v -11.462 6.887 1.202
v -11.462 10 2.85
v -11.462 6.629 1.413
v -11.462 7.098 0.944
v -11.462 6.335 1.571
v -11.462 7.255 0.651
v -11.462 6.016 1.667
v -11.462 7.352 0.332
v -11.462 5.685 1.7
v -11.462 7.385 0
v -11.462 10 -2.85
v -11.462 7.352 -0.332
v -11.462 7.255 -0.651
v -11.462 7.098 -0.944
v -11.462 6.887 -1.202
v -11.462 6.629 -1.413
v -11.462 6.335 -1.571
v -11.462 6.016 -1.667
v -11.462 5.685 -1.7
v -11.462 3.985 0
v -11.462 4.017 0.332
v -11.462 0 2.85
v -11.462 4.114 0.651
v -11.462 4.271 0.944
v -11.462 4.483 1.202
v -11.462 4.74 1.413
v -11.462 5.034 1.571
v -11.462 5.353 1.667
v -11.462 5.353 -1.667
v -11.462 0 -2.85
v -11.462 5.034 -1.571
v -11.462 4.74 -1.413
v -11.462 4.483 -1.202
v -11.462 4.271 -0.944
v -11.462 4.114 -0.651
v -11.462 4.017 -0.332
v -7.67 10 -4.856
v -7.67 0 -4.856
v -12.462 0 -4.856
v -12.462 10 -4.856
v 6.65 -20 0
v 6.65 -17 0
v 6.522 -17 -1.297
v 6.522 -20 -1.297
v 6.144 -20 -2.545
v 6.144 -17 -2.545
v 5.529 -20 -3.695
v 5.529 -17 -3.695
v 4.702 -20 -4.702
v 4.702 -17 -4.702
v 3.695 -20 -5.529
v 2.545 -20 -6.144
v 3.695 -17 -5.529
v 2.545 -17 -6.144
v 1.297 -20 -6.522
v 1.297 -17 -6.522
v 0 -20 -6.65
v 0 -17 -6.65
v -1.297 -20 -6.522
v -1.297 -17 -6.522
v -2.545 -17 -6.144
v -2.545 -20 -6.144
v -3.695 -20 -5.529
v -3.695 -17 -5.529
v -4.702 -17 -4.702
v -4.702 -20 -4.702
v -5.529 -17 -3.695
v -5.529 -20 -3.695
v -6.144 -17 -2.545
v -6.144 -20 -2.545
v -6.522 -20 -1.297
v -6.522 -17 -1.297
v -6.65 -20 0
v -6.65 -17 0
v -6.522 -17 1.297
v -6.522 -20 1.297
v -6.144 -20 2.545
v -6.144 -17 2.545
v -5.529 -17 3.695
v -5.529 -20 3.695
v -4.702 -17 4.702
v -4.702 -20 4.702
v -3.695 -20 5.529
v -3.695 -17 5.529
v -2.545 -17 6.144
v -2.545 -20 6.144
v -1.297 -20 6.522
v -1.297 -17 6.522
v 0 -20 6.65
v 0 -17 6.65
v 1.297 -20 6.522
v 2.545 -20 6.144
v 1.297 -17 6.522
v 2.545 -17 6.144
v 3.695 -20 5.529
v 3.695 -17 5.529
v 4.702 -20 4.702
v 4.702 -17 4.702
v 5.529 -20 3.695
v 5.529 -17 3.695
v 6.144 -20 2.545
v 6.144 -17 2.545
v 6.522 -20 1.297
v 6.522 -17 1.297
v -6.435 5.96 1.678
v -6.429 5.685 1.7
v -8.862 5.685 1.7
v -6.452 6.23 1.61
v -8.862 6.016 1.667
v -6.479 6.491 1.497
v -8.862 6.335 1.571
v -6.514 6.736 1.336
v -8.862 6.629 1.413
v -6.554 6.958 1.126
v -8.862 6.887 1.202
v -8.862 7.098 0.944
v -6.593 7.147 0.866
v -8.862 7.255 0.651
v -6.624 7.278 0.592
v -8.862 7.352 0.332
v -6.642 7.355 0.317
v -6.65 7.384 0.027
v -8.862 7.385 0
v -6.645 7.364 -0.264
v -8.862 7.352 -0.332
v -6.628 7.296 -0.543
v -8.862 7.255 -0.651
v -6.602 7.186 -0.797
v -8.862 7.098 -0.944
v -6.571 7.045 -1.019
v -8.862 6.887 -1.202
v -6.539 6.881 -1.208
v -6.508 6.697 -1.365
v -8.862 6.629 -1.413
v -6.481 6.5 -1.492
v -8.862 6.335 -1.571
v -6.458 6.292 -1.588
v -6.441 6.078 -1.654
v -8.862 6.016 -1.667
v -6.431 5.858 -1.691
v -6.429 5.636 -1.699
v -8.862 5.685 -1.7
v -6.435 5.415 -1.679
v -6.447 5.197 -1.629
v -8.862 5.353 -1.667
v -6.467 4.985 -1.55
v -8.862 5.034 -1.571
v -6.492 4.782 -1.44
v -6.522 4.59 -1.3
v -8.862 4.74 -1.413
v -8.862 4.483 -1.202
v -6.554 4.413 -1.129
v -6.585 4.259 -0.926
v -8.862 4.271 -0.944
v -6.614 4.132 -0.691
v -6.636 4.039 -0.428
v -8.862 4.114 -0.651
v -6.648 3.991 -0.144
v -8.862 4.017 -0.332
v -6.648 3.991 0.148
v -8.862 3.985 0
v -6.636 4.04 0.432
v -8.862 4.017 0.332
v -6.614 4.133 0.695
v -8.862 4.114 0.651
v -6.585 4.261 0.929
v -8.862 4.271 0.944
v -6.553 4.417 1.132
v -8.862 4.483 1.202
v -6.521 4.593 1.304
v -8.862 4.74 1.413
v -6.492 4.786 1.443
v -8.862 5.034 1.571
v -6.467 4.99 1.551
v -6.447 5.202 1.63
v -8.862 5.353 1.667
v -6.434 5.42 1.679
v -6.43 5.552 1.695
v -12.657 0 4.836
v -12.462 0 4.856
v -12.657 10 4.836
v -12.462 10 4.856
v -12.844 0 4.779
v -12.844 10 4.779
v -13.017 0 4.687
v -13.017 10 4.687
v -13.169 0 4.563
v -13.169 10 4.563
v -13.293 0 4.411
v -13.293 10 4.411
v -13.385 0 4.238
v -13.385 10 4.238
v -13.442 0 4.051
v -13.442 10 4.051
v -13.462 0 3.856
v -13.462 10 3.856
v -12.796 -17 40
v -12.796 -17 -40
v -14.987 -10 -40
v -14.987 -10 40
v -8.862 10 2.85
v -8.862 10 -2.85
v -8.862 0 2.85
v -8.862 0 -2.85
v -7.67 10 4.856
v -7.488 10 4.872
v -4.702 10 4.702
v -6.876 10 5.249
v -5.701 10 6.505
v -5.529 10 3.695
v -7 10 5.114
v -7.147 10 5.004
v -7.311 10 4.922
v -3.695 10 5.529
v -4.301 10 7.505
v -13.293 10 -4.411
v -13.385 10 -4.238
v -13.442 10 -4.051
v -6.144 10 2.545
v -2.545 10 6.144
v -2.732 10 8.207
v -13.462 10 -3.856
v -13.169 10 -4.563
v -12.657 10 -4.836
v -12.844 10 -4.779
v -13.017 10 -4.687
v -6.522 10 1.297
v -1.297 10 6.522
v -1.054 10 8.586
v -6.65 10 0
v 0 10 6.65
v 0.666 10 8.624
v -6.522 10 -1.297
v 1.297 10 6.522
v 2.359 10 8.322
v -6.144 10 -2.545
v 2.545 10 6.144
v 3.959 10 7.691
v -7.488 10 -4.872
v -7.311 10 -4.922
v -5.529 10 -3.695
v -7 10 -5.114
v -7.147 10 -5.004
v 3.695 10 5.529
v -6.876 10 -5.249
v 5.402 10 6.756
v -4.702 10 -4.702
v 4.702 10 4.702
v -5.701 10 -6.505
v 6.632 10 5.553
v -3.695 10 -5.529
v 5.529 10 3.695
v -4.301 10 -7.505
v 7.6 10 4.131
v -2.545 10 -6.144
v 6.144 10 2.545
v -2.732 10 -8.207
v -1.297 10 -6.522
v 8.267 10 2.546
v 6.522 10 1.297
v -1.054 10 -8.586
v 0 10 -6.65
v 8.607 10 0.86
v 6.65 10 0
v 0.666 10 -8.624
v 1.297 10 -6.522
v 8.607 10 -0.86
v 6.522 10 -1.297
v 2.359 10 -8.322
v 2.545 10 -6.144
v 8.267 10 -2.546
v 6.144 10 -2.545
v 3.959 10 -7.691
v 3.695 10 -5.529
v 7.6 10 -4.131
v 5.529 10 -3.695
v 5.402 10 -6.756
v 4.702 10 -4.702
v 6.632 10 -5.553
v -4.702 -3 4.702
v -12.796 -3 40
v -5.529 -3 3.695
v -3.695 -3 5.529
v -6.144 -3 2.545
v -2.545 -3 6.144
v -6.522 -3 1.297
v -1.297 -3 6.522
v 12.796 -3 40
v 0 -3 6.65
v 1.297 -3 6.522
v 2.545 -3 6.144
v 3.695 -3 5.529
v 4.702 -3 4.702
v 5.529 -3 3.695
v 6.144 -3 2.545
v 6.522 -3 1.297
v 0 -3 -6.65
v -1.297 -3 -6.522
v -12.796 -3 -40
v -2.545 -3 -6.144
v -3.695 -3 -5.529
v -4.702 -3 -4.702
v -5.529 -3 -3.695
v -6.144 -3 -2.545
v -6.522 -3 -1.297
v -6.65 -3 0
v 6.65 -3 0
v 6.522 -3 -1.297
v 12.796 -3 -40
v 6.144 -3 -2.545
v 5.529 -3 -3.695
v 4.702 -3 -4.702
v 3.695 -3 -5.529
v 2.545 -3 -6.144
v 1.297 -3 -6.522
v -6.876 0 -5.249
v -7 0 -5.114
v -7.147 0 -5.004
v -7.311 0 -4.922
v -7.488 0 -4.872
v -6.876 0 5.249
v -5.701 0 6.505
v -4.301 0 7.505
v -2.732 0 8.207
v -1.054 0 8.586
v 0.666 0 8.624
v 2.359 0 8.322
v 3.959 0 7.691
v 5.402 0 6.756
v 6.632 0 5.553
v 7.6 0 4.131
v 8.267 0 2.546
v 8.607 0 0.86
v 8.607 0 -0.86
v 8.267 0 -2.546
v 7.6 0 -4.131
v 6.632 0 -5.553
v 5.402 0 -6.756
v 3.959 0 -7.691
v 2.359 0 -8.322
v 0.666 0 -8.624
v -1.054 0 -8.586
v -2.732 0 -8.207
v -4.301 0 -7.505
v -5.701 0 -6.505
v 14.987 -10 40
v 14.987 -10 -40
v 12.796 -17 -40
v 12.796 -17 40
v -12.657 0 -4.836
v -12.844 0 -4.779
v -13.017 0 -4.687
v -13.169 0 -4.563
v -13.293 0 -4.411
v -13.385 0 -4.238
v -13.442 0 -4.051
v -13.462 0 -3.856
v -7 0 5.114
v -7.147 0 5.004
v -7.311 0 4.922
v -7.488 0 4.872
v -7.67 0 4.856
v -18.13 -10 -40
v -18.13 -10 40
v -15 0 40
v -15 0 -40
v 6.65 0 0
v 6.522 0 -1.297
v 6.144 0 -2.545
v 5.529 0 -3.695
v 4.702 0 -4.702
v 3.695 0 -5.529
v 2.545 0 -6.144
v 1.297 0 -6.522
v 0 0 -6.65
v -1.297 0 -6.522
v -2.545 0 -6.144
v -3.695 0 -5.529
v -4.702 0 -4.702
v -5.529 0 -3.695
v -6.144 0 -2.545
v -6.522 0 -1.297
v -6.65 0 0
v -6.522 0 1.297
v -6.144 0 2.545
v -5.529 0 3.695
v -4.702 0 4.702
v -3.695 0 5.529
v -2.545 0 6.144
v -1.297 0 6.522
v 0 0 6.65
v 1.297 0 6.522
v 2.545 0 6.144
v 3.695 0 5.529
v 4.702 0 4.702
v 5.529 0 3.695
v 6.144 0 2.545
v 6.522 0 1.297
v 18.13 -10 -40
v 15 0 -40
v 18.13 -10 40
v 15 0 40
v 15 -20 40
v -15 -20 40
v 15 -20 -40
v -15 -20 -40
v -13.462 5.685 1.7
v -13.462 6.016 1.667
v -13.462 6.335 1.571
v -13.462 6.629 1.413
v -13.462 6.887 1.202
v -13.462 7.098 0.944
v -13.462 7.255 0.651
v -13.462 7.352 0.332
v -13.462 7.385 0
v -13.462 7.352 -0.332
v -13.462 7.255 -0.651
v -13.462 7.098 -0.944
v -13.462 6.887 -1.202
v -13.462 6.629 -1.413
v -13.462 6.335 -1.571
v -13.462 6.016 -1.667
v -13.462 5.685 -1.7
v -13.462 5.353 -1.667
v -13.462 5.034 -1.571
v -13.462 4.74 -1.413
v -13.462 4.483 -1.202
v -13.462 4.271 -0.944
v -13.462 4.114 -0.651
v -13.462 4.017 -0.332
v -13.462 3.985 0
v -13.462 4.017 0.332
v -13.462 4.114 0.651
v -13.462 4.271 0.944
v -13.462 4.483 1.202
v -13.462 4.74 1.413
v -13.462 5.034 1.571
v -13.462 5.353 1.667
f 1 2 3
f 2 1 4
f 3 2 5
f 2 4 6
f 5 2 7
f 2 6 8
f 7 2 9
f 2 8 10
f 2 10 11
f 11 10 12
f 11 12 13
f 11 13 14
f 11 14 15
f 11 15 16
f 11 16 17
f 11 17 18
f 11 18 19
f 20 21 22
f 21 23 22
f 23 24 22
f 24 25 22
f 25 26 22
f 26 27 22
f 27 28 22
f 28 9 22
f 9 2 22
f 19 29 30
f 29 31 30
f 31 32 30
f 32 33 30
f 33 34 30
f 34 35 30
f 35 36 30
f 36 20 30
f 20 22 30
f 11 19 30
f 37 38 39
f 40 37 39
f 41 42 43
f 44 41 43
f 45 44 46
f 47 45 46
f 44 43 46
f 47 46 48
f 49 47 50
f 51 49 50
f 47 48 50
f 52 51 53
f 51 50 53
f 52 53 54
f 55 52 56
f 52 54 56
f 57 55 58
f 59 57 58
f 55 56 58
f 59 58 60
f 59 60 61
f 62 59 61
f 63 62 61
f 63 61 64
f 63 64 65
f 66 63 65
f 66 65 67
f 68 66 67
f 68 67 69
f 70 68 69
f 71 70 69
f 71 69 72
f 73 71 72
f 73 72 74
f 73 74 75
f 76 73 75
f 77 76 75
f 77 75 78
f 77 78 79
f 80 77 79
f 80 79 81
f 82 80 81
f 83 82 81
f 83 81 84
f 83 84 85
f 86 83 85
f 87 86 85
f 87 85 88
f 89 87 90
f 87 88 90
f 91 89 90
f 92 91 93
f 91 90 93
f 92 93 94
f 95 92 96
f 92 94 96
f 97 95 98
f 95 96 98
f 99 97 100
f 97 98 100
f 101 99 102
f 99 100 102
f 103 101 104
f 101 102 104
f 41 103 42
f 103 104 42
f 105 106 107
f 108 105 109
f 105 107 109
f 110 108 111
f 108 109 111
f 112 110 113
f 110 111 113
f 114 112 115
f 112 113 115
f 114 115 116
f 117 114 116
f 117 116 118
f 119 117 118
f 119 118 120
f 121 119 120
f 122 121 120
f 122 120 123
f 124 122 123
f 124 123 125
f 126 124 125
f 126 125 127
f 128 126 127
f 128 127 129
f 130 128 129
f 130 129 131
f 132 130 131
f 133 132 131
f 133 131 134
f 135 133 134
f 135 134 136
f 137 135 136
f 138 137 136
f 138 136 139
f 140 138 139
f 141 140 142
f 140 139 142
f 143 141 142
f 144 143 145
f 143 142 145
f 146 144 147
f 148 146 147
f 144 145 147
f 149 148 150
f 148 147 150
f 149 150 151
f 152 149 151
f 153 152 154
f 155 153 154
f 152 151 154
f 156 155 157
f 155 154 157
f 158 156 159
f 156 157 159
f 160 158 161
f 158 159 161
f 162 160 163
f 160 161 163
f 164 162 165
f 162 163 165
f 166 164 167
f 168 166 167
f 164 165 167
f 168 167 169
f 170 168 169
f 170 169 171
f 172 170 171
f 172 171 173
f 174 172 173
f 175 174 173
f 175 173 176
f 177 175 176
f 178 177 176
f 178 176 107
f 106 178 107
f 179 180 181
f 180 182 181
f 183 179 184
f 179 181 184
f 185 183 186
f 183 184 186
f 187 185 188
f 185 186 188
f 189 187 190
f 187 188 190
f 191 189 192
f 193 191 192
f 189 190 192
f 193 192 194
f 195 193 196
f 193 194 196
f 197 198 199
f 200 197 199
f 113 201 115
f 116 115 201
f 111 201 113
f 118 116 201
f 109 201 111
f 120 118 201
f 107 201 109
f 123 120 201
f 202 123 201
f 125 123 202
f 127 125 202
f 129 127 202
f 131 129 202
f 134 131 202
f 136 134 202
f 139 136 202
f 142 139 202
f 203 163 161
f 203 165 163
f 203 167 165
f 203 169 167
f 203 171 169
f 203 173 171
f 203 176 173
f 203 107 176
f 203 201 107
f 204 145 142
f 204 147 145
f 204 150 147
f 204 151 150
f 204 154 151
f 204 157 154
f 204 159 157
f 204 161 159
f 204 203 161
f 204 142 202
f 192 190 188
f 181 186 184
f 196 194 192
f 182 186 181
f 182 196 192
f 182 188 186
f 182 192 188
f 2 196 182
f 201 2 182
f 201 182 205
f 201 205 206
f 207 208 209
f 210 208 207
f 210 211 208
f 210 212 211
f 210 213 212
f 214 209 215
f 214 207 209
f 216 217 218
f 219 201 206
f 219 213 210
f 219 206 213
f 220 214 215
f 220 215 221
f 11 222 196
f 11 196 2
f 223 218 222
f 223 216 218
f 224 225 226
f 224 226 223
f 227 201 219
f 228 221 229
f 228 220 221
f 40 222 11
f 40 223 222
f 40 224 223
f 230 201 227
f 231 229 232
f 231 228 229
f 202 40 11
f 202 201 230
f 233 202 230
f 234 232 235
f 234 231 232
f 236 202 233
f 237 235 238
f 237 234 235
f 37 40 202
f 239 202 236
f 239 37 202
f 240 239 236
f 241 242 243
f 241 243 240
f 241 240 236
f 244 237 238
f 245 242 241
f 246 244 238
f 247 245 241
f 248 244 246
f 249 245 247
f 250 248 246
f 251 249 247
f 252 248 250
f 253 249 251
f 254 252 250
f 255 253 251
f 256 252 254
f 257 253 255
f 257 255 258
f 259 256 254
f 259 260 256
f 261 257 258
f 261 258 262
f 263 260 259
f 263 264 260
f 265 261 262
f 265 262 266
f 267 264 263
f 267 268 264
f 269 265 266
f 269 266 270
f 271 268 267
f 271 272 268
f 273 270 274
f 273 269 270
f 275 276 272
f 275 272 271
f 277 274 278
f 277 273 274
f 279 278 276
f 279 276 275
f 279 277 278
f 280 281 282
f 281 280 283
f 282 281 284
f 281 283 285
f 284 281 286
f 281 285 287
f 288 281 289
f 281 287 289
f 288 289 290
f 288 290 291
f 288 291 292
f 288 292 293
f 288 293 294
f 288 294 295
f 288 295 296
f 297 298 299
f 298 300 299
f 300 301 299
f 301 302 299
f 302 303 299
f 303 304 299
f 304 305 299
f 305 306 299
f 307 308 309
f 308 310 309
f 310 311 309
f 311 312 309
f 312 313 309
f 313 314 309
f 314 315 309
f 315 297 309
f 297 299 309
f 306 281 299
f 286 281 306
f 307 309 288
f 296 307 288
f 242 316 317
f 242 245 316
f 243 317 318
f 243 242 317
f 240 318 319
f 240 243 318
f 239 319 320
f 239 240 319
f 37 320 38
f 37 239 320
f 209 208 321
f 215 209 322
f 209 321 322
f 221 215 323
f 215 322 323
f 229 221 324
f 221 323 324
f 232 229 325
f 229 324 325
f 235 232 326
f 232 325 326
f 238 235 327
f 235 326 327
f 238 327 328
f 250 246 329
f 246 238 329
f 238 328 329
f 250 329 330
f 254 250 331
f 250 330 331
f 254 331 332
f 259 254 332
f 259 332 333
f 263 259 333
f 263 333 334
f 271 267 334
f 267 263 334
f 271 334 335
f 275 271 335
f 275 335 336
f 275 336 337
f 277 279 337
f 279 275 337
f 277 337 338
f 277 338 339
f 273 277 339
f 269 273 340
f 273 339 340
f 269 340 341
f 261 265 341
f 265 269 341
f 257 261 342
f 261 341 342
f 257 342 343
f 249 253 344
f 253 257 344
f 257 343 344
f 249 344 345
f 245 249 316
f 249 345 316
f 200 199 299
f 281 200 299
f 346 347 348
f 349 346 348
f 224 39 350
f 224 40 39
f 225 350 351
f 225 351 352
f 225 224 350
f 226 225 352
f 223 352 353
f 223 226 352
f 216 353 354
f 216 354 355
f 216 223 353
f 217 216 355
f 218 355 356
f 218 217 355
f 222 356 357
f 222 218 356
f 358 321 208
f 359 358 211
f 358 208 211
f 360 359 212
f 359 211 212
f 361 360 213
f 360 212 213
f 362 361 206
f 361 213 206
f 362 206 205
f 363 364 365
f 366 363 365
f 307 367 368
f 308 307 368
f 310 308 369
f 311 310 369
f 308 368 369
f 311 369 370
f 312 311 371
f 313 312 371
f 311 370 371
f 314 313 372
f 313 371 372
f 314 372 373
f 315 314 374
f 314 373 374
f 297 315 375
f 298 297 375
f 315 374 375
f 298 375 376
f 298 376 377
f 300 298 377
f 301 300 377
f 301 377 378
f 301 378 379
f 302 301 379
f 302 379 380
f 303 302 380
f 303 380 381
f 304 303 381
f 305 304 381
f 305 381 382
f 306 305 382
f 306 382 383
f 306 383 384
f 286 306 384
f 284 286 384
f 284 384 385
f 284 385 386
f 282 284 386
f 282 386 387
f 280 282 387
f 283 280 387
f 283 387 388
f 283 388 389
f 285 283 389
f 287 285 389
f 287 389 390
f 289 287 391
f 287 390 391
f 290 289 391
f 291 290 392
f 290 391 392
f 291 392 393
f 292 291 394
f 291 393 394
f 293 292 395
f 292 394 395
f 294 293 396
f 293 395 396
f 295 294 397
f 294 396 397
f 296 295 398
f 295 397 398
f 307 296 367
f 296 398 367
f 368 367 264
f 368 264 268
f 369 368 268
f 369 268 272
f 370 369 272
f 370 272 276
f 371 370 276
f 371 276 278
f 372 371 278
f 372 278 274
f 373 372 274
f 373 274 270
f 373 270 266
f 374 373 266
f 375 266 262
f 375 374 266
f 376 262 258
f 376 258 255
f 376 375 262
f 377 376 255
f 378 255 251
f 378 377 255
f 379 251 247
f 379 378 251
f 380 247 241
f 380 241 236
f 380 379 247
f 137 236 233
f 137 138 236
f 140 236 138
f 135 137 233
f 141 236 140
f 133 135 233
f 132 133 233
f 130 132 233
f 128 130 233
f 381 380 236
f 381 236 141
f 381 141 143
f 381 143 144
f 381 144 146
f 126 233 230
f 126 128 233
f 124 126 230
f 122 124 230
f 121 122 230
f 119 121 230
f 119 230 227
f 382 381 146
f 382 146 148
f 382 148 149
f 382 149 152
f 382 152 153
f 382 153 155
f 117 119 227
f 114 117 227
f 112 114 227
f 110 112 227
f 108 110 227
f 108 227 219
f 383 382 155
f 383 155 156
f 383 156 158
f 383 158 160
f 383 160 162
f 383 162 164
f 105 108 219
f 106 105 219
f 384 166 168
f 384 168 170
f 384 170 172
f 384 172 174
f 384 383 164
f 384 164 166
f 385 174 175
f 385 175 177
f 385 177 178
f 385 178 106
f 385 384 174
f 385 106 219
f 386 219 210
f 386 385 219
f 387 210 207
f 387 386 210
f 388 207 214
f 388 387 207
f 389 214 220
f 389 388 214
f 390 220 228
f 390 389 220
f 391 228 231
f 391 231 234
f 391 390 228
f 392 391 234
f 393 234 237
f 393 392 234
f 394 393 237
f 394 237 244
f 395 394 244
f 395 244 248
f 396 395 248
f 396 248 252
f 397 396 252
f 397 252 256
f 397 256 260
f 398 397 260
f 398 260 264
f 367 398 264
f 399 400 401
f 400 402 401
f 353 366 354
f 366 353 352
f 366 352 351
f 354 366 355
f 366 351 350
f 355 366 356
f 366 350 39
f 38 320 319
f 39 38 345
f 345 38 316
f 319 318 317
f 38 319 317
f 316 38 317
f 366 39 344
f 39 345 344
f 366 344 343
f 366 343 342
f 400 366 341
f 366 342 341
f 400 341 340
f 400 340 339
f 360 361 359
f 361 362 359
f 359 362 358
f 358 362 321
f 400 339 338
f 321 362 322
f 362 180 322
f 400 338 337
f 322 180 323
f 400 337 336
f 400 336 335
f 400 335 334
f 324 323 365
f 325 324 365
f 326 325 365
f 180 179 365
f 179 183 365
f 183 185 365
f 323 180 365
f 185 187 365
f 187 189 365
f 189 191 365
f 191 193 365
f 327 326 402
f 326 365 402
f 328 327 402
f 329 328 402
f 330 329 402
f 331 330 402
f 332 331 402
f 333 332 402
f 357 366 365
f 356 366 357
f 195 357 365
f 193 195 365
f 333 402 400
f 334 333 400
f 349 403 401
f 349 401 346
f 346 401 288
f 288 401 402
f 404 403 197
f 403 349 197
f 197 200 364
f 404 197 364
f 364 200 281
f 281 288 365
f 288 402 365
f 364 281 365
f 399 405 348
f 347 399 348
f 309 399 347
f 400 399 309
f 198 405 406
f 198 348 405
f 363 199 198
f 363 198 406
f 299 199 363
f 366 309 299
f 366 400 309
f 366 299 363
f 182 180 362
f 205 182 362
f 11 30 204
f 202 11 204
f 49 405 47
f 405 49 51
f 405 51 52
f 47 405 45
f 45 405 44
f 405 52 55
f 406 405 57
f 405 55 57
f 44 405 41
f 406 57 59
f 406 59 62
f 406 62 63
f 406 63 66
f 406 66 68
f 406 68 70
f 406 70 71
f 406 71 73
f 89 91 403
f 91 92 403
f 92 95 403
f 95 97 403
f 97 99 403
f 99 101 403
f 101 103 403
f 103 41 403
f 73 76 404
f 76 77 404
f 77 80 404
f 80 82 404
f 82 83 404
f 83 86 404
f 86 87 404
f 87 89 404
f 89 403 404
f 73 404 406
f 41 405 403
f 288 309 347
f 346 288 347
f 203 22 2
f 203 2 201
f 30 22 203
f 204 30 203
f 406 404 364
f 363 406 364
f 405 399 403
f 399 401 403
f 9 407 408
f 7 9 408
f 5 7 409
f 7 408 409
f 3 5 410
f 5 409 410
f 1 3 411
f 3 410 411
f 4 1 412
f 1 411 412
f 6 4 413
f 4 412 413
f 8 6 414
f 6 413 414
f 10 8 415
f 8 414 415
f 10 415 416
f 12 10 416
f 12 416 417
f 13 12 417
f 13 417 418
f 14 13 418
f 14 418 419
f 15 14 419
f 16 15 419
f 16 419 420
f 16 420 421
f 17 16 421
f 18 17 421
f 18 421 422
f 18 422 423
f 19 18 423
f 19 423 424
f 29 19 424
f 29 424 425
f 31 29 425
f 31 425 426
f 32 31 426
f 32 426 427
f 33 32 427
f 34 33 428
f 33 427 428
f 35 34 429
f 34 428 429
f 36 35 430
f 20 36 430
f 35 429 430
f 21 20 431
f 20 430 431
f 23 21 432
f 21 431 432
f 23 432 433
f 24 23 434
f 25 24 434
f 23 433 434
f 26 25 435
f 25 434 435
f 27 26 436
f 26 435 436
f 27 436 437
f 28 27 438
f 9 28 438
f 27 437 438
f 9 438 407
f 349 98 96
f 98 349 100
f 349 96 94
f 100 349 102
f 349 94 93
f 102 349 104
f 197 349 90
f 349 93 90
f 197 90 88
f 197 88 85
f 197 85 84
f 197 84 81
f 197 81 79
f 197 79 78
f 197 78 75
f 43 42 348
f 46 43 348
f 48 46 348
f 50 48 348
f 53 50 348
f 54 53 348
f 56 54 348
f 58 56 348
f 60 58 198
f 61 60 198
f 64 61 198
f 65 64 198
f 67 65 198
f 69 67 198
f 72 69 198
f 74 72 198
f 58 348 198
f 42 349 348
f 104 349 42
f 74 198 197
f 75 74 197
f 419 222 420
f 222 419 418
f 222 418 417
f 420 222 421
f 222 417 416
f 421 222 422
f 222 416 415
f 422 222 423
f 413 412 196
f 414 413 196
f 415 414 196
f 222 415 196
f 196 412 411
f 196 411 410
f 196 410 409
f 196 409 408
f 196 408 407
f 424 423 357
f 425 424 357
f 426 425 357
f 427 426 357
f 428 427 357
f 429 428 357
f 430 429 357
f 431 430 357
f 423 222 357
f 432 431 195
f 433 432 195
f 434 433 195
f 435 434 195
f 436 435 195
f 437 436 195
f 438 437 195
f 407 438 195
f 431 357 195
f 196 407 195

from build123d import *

# Parameters (mm, degrees)
EXTRUDE_1_DEPTH     = 40
CUT_EXTRUDE_3_DEPTH = 81
SKETCH_8_R          = 6.65
CUT_EXTRUDE_4_DEPTH = 21
SKETCH_9_R          = 8.65
SKETCH_9_R_2        = 6.65
EXTRUDE_2_DEPTH     = 10
SKETCH_10_W         = 2.6
SKETCH_10_H         = 5.7
EXTRUDE_3_DEPTH     = 10
SKETCH_11_R         = 1.7
CUT_EXTRUDE_5_DEPTH = 10
FILLET_1_R          = 1


with BuildPart() as part:
    # 草图1 → 凸台-拉伸1 (new body, symmetric)
    with BuildSketch(Plane.XY):
        Polygon((-15, 0), (15, 0), (18.130448736, -10), (15, -20), (-15, -20), (-18.130448736, -10), align=None)
    extrude(amount=EXTRUDE_1_DEPTH, both=True)

    # 草图7 → 切除-拉伸3 (cut, through all)
    with BuildSketch(Plane(origin=(0, 0, -40), x_dir=(-1, 0, 0), z_dir=(0, 0, -1))):
        Polygon((14.986888042, -10), (12.795573927, -3), (-12.795573927, -3), (-14.986888042, -10), (-12.795573927, -17), (12.795573927, -17), align=None)
    extrude(amount=-CUT_EXTRUDE_3_DEPTH, mode=Mode.SUBTRACT)

    # 草图8 → 切除-拉伸4 (cut, through all)
    with BuildSketch(Plane(origin=(0, 0, 0), x_dir=(1, 0, 0), z_dir=(0, 1, 0))):
        Circle(SKETCH_8_R)
    extrude(amount=-CUT_EXTRUDE_4_DEPTH, mode=Mode.SUBTRACT)

    # 草图9 → 凸台-拉伸2 (add)
    with BuildSketch(Plane(origin=(0, 0, 0), x_dir=(1, 0, 0), z_dir=(0, 1, 0))):
        Circle(SKETCH_9_R)
        Circle(SKETCH_9_R_2, mode=Mode.SUBTRACT)
    extrude(amount=EXTRUDE_2_DEPTH)

    # 草图10 → 凸台-拉伸3 (add)
    with BuildSketch(Plane(origin=(0, 0, 0), x_dir=(1, 0, 0), z_dir=(0, 1, 0))):
        with BuildLine():
            ThreePointArc((-7.158670401, -4.855505955), (-8.65, 0), (-7.158670401, 4.855505955))
            Line((-7.158670401, 4.855505955), (-13.461589548, 4.855505955))
            Line((-13.461589548, 4.855505955), (-13.461589548, -4.855505955))
            Line((-13.461589548, -4.855505955), (-7.158670401, -4.855505955))
        make_face()
        with Locations((-10.161589548, 0)):
            Rectangle(SKETCH_10_W, SKETCH_10_H, mode=Mode.SUBTRACT)
    extrude(amount=EXTRUDE_3_DEPTH)

    # 草图11 → 切除-拉伸5 (cut)
    with BuildSketch(Plane.ZY.offset(13.461589548)):
        with Locations((0, 5.684678401)):
            Circle(SKETCH_11_R)
    extrude(amount=-CUT_EXTRUDE_5_DEPTH, mode=Mode.SUBTRACT)

    # 圆角1
    fillet_1_edges = [part.edges().sort_by_distance(p)[0] for p in [
        (-13.461589548, 5, -4.855505955),
        (-13.461589548, 5, 4.855505955),
        (-7.158670401, 5, 4.855505955),
        (-7.158670401, 5, -4.855505955),
    ]]
    fillet(fillet_1_edges, radius=FILLET_1_R)


solid = part.part
